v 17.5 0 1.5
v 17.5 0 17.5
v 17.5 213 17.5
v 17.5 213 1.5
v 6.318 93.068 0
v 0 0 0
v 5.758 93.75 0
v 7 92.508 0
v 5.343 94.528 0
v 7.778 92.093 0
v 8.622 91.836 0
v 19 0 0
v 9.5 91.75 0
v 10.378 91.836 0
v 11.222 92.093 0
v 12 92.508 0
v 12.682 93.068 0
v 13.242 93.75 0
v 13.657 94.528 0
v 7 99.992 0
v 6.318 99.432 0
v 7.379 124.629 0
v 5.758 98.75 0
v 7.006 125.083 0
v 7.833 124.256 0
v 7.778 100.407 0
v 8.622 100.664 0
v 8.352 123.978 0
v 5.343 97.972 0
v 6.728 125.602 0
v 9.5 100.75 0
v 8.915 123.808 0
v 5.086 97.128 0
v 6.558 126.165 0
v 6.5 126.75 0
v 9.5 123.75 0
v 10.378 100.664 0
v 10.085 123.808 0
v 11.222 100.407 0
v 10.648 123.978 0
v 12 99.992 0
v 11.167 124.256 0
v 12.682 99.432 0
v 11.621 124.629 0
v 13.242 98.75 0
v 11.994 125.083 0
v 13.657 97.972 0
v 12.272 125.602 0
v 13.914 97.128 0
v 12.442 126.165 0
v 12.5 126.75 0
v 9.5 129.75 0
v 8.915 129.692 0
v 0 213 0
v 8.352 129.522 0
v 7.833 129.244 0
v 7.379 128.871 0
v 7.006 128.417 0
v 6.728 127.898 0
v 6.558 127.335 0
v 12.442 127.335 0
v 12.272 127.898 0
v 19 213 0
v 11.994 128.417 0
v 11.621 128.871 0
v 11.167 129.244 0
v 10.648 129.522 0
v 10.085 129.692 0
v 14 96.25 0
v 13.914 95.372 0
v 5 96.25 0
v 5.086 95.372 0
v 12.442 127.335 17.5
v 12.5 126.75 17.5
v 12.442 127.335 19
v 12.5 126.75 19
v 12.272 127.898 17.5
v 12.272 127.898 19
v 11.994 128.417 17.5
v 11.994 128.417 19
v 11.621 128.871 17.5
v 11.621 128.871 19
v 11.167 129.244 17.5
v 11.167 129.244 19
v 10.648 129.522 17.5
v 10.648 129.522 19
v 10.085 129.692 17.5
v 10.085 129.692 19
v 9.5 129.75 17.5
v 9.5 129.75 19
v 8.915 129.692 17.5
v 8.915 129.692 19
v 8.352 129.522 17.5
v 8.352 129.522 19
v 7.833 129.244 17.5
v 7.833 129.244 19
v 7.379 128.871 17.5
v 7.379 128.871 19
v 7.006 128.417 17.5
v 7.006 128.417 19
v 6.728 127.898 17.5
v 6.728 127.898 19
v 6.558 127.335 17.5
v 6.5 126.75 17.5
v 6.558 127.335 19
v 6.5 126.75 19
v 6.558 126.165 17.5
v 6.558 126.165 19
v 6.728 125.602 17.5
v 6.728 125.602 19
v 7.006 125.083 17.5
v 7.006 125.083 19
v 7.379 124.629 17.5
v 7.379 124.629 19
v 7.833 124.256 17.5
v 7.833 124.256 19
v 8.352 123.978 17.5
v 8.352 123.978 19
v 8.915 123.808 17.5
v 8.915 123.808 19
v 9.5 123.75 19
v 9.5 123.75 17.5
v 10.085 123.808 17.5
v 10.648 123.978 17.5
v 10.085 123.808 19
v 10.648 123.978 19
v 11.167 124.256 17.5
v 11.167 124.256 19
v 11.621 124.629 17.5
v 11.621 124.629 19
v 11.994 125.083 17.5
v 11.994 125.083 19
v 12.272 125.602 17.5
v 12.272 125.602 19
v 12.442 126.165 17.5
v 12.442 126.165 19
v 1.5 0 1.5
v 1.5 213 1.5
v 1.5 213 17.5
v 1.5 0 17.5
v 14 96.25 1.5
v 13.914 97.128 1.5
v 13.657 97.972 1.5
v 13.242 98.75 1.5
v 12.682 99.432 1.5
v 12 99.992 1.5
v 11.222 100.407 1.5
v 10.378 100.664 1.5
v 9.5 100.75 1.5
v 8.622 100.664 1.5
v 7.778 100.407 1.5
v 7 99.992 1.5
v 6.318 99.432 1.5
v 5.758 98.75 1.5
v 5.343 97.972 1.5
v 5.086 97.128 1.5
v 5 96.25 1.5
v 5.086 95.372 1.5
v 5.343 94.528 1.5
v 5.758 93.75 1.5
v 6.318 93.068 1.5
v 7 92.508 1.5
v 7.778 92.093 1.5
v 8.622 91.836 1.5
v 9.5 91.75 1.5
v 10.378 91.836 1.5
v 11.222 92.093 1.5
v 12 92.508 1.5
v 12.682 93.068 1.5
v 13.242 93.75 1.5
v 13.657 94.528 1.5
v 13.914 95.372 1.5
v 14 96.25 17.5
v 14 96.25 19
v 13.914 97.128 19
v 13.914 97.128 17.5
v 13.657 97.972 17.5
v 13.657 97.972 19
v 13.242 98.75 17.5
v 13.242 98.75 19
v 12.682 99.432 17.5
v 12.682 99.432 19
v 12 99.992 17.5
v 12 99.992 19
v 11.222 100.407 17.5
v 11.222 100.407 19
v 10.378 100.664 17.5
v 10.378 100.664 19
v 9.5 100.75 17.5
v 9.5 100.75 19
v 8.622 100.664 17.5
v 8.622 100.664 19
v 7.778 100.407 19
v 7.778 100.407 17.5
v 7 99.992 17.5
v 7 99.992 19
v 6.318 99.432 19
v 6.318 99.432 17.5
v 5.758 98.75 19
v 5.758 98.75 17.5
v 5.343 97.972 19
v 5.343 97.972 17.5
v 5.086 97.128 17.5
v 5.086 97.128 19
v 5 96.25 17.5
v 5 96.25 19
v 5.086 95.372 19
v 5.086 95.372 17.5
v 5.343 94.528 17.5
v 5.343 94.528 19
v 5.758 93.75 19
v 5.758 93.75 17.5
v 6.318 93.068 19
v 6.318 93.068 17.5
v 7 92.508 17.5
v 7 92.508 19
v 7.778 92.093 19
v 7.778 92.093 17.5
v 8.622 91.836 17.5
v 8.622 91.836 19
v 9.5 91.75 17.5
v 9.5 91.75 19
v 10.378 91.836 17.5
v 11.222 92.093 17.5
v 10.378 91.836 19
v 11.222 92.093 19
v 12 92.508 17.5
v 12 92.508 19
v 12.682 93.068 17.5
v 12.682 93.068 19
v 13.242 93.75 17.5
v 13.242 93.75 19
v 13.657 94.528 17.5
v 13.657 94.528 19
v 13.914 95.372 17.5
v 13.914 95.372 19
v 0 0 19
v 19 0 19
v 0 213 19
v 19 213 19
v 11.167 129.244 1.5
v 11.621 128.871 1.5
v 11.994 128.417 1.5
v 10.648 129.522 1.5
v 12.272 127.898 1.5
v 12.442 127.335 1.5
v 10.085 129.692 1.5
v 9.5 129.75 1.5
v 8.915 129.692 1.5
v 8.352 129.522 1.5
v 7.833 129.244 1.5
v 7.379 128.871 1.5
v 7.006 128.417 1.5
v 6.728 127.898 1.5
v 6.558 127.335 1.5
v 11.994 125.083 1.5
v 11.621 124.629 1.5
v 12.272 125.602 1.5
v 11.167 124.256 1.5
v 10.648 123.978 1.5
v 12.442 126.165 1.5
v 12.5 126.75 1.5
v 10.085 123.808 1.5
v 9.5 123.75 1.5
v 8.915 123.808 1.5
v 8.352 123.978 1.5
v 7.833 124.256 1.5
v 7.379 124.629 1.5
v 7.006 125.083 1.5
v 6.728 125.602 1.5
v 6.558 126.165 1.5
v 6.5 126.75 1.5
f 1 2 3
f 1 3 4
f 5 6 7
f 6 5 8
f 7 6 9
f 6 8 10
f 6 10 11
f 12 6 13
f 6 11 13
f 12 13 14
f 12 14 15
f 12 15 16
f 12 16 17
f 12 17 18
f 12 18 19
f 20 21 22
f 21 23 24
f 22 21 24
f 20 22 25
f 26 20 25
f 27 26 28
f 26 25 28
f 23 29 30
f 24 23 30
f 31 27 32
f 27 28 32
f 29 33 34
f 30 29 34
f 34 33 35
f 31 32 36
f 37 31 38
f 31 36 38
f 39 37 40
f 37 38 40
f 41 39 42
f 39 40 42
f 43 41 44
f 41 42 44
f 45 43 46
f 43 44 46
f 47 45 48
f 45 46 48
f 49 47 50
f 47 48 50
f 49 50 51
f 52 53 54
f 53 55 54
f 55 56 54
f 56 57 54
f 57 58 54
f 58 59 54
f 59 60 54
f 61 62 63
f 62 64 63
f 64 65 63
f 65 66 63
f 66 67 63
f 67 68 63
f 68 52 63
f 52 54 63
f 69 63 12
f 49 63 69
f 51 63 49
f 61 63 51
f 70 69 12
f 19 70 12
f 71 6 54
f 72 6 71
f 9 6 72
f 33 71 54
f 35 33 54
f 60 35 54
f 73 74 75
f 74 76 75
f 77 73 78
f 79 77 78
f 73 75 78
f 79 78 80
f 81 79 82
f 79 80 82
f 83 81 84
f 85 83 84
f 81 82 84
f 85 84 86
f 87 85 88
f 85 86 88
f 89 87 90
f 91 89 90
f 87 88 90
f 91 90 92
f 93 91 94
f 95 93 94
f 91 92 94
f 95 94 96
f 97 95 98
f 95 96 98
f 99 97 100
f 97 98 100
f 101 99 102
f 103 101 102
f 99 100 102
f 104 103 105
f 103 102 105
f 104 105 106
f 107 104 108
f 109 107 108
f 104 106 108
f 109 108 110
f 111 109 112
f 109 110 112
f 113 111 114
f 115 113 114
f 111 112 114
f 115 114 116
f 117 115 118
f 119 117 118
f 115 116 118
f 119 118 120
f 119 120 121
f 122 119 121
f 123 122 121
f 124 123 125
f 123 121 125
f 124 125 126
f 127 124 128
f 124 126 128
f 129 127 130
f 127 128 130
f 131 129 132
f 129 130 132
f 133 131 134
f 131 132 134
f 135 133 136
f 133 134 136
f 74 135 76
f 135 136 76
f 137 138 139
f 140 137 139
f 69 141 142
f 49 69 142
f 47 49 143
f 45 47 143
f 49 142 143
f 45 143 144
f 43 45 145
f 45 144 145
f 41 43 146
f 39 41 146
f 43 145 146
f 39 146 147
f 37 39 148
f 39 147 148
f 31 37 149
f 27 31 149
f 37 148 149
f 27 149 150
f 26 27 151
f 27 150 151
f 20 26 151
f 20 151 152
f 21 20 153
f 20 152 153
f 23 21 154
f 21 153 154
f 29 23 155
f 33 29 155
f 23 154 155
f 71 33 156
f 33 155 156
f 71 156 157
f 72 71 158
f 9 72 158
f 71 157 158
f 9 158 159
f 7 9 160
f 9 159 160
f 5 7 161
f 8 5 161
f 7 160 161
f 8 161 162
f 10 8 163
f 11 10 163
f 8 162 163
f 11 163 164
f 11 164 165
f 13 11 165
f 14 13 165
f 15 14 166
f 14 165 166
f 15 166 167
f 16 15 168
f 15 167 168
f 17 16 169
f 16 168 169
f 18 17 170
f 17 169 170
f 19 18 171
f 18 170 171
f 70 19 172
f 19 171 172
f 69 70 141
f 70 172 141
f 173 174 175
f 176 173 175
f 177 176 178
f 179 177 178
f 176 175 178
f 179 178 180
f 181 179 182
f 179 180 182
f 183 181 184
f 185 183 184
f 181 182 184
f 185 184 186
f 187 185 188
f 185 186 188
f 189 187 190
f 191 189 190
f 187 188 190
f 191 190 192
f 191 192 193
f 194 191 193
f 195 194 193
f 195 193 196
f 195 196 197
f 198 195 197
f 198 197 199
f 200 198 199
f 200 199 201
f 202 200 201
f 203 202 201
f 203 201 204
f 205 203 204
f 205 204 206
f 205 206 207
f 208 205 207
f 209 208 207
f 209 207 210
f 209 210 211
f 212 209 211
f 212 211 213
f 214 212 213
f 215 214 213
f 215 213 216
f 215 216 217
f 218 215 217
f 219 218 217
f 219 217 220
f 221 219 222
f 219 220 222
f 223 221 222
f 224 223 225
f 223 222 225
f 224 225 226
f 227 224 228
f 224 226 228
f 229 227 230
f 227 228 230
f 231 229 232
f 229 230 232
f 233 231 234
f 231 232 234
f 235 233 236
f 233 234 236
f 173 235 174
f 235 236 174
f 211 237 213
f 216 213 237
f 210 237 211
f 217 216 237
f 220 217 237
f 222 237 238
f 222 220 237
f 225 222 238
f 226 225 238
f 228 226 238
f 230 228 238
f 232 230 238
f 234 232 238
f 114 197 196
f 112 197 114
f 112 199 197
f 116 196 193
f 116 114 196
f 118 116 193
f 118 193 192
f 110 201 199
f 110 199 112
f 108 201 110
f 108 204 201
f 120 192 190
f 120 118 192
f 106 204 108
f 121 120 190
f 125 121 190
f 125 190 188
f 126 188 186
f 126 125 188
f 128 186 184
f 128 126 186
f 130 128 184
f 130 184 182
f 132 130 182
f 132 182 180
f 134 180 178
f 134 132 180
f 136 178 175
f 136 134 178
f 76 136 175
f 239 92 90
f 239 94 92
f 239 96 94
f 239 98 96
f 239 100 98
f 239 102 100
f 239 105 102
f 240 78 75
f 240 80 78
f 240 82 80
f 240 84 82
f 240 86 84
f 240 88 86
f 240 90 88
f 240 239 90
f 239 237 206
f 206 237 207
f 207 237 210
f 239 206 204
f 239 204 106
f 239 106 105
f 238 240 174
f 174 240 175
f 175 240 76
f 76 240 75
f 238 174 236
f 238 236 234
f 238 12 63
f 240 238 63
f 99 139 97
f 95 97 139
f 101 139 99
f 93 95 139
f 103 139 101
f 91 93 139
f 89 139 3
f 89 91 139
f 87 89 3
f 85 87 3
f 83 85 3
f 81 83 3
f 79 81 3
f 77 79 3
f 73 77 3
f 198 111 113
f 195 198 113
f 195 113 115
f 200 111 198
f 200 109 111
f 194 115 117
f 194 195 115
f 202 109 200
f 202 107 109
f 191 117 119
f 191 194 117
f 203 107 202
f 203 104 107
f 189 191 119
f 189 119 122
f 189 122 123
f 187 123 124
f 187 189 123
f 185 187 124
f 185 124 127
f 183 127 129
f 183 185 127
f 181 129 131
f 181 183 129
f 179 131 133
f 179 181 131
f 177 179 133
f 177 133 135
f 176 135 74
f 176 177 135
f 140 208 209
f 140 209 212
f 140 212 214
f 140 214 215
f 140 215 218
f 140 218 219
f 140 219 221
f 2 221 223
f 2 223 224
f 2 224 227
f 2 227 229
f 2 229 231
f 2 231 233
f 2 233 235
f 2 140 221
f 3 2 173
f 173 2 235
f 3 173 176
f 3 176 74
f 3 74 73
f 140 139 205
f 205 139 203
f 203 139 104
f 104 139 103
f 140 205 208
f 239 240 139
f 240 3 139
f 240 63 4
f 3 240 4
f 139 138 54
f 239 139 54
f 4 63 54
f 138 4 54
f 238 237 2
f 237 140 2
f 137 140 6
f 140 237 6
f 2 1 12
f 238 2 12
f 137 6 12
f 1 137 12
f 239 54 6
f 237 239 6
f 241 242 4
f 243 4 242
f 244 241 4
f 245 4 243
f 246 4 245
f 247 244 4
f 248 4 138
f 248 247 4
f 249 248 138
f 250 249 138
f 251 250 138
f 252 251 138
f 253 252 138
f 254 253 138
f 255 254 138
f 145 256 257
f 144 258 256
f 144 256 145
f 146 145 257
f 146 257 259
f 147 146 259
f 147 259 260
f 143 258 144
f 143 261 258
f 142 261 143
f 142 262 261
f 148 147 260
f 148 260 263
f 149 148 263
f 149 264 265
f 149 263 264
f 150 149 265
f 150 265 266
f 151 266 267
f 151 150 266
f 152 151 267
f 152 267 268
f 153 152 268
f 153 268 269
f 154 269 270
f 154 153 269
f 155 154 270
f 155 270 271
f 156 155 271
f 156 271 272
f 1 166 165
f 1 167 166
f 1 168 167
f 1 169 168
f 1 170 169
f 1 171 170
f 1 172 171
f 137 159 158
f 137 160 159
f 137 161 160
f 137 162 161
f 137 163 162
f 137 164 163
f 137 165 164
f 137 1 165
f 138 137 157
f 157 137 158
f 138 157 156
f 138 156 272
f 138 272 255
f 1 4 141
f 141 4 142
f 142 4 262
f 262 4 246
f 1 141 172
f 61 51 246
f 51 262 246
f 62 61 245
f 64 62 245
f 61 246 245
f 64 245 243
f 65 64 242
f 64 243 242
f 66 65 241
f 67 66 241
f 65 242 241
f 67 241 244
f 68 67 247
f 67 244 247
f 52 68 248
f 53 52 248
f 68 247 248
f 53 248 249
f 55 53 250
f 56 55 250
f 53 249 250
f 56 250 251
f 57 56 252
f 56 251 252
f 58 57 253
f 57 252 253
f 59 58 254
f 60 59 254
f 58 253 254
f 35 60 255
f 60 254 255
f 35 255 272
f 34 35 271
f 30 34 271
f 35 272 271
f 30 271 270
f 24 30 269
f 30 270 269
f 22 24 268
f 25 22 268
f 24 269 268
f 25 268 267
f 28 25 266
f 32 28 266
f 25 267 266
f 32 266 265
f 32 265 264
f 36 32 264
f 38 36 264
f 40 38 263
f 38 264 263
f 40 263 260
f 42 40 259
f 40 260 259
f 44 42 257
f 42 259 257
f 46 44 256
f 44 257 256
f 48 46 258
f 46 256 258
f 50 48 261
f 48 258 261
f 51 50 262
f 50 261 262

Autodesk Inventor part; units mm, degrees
ref_plane "YZ Plane" through (0, 0, 0) normal (1, 0, 0) x (0, 1, 0)
ref_plane "XZ Plane" through (0, 0, 0) normal (0, 1, 0) x (-1, 0, 0)
ref_plane "XY Plane" through (0, 0, 0) normal (0, 0, 1) x (1, 0, 0)
sketch "Sketch1" plane through (0, 0, 0) normal (0, 0, 1) x (1, 0, 0)
  line L0 (0, 0) -> (19, 0)
  line L1 (19, 0) -> (19, 213)
  line L2 (19, 213) -> (0, 213)
  line L3 (0, 213) -> (0, 0)
  dimension "d0" = 19
  dimension "d1" = 213
extrude "Extrusion1" add sketch "Sketch1" along normal blind 19
sketch "Sketch2" plane through (0, 0, 0) normal (0, -1, 0) x (1, 0, 0)
  line L0 (0, 0) -> (19, 0) projected
  line L1 (19, 0) -> (19, 19) projected
  line L2 (0, 19) -> (19, 19) projected
  line L3 (0, 0) -> (0, 19) projected
  line L4 (17.5, 17.5) -> (17.5, 1.5)
  line L5 (17.5, 1.5) -> (1.5, 1.5)
  line L6 (1.5, 1.5) -> (1.5, 17.5)
  line L7 (1.5, 17.5) -> (17.5, 17.5)
  dimension "d4" = 1.5
extrude "Extrusion2" cut sketch "Sketch2" against normal through all contours L4 L5 L6 L7
sketch "Sketch3" plane through (0, 0, 19) normal (0, 0, 1) x (1, 0, 0)
  line L0 (9.5, 96.25) -> (9.5, 126.75) construction
  circle A0 centre (9.5, 126.75) radius 3
  circle A1 centre (9.5, 96.25) radius 4.5
  line L1 (19, 0) -> (19, 213) projected
  line L2 (19, 213) -> (0, 213) projected
  point P0 (0, 0)
  point P1 (19, 106.5)
  point P2 (9.5, 111.5)
  point P3 (9.5, 213)
  dimension "d7" = 30.5
  dimension "d8" = 6
  dimension "d9" = 9
  dimension "d12" = 5
extrude "Extrusion3" cut sketch "Sketch3" against normal through all
properties part number "C010" material "Aluminum 6061"
